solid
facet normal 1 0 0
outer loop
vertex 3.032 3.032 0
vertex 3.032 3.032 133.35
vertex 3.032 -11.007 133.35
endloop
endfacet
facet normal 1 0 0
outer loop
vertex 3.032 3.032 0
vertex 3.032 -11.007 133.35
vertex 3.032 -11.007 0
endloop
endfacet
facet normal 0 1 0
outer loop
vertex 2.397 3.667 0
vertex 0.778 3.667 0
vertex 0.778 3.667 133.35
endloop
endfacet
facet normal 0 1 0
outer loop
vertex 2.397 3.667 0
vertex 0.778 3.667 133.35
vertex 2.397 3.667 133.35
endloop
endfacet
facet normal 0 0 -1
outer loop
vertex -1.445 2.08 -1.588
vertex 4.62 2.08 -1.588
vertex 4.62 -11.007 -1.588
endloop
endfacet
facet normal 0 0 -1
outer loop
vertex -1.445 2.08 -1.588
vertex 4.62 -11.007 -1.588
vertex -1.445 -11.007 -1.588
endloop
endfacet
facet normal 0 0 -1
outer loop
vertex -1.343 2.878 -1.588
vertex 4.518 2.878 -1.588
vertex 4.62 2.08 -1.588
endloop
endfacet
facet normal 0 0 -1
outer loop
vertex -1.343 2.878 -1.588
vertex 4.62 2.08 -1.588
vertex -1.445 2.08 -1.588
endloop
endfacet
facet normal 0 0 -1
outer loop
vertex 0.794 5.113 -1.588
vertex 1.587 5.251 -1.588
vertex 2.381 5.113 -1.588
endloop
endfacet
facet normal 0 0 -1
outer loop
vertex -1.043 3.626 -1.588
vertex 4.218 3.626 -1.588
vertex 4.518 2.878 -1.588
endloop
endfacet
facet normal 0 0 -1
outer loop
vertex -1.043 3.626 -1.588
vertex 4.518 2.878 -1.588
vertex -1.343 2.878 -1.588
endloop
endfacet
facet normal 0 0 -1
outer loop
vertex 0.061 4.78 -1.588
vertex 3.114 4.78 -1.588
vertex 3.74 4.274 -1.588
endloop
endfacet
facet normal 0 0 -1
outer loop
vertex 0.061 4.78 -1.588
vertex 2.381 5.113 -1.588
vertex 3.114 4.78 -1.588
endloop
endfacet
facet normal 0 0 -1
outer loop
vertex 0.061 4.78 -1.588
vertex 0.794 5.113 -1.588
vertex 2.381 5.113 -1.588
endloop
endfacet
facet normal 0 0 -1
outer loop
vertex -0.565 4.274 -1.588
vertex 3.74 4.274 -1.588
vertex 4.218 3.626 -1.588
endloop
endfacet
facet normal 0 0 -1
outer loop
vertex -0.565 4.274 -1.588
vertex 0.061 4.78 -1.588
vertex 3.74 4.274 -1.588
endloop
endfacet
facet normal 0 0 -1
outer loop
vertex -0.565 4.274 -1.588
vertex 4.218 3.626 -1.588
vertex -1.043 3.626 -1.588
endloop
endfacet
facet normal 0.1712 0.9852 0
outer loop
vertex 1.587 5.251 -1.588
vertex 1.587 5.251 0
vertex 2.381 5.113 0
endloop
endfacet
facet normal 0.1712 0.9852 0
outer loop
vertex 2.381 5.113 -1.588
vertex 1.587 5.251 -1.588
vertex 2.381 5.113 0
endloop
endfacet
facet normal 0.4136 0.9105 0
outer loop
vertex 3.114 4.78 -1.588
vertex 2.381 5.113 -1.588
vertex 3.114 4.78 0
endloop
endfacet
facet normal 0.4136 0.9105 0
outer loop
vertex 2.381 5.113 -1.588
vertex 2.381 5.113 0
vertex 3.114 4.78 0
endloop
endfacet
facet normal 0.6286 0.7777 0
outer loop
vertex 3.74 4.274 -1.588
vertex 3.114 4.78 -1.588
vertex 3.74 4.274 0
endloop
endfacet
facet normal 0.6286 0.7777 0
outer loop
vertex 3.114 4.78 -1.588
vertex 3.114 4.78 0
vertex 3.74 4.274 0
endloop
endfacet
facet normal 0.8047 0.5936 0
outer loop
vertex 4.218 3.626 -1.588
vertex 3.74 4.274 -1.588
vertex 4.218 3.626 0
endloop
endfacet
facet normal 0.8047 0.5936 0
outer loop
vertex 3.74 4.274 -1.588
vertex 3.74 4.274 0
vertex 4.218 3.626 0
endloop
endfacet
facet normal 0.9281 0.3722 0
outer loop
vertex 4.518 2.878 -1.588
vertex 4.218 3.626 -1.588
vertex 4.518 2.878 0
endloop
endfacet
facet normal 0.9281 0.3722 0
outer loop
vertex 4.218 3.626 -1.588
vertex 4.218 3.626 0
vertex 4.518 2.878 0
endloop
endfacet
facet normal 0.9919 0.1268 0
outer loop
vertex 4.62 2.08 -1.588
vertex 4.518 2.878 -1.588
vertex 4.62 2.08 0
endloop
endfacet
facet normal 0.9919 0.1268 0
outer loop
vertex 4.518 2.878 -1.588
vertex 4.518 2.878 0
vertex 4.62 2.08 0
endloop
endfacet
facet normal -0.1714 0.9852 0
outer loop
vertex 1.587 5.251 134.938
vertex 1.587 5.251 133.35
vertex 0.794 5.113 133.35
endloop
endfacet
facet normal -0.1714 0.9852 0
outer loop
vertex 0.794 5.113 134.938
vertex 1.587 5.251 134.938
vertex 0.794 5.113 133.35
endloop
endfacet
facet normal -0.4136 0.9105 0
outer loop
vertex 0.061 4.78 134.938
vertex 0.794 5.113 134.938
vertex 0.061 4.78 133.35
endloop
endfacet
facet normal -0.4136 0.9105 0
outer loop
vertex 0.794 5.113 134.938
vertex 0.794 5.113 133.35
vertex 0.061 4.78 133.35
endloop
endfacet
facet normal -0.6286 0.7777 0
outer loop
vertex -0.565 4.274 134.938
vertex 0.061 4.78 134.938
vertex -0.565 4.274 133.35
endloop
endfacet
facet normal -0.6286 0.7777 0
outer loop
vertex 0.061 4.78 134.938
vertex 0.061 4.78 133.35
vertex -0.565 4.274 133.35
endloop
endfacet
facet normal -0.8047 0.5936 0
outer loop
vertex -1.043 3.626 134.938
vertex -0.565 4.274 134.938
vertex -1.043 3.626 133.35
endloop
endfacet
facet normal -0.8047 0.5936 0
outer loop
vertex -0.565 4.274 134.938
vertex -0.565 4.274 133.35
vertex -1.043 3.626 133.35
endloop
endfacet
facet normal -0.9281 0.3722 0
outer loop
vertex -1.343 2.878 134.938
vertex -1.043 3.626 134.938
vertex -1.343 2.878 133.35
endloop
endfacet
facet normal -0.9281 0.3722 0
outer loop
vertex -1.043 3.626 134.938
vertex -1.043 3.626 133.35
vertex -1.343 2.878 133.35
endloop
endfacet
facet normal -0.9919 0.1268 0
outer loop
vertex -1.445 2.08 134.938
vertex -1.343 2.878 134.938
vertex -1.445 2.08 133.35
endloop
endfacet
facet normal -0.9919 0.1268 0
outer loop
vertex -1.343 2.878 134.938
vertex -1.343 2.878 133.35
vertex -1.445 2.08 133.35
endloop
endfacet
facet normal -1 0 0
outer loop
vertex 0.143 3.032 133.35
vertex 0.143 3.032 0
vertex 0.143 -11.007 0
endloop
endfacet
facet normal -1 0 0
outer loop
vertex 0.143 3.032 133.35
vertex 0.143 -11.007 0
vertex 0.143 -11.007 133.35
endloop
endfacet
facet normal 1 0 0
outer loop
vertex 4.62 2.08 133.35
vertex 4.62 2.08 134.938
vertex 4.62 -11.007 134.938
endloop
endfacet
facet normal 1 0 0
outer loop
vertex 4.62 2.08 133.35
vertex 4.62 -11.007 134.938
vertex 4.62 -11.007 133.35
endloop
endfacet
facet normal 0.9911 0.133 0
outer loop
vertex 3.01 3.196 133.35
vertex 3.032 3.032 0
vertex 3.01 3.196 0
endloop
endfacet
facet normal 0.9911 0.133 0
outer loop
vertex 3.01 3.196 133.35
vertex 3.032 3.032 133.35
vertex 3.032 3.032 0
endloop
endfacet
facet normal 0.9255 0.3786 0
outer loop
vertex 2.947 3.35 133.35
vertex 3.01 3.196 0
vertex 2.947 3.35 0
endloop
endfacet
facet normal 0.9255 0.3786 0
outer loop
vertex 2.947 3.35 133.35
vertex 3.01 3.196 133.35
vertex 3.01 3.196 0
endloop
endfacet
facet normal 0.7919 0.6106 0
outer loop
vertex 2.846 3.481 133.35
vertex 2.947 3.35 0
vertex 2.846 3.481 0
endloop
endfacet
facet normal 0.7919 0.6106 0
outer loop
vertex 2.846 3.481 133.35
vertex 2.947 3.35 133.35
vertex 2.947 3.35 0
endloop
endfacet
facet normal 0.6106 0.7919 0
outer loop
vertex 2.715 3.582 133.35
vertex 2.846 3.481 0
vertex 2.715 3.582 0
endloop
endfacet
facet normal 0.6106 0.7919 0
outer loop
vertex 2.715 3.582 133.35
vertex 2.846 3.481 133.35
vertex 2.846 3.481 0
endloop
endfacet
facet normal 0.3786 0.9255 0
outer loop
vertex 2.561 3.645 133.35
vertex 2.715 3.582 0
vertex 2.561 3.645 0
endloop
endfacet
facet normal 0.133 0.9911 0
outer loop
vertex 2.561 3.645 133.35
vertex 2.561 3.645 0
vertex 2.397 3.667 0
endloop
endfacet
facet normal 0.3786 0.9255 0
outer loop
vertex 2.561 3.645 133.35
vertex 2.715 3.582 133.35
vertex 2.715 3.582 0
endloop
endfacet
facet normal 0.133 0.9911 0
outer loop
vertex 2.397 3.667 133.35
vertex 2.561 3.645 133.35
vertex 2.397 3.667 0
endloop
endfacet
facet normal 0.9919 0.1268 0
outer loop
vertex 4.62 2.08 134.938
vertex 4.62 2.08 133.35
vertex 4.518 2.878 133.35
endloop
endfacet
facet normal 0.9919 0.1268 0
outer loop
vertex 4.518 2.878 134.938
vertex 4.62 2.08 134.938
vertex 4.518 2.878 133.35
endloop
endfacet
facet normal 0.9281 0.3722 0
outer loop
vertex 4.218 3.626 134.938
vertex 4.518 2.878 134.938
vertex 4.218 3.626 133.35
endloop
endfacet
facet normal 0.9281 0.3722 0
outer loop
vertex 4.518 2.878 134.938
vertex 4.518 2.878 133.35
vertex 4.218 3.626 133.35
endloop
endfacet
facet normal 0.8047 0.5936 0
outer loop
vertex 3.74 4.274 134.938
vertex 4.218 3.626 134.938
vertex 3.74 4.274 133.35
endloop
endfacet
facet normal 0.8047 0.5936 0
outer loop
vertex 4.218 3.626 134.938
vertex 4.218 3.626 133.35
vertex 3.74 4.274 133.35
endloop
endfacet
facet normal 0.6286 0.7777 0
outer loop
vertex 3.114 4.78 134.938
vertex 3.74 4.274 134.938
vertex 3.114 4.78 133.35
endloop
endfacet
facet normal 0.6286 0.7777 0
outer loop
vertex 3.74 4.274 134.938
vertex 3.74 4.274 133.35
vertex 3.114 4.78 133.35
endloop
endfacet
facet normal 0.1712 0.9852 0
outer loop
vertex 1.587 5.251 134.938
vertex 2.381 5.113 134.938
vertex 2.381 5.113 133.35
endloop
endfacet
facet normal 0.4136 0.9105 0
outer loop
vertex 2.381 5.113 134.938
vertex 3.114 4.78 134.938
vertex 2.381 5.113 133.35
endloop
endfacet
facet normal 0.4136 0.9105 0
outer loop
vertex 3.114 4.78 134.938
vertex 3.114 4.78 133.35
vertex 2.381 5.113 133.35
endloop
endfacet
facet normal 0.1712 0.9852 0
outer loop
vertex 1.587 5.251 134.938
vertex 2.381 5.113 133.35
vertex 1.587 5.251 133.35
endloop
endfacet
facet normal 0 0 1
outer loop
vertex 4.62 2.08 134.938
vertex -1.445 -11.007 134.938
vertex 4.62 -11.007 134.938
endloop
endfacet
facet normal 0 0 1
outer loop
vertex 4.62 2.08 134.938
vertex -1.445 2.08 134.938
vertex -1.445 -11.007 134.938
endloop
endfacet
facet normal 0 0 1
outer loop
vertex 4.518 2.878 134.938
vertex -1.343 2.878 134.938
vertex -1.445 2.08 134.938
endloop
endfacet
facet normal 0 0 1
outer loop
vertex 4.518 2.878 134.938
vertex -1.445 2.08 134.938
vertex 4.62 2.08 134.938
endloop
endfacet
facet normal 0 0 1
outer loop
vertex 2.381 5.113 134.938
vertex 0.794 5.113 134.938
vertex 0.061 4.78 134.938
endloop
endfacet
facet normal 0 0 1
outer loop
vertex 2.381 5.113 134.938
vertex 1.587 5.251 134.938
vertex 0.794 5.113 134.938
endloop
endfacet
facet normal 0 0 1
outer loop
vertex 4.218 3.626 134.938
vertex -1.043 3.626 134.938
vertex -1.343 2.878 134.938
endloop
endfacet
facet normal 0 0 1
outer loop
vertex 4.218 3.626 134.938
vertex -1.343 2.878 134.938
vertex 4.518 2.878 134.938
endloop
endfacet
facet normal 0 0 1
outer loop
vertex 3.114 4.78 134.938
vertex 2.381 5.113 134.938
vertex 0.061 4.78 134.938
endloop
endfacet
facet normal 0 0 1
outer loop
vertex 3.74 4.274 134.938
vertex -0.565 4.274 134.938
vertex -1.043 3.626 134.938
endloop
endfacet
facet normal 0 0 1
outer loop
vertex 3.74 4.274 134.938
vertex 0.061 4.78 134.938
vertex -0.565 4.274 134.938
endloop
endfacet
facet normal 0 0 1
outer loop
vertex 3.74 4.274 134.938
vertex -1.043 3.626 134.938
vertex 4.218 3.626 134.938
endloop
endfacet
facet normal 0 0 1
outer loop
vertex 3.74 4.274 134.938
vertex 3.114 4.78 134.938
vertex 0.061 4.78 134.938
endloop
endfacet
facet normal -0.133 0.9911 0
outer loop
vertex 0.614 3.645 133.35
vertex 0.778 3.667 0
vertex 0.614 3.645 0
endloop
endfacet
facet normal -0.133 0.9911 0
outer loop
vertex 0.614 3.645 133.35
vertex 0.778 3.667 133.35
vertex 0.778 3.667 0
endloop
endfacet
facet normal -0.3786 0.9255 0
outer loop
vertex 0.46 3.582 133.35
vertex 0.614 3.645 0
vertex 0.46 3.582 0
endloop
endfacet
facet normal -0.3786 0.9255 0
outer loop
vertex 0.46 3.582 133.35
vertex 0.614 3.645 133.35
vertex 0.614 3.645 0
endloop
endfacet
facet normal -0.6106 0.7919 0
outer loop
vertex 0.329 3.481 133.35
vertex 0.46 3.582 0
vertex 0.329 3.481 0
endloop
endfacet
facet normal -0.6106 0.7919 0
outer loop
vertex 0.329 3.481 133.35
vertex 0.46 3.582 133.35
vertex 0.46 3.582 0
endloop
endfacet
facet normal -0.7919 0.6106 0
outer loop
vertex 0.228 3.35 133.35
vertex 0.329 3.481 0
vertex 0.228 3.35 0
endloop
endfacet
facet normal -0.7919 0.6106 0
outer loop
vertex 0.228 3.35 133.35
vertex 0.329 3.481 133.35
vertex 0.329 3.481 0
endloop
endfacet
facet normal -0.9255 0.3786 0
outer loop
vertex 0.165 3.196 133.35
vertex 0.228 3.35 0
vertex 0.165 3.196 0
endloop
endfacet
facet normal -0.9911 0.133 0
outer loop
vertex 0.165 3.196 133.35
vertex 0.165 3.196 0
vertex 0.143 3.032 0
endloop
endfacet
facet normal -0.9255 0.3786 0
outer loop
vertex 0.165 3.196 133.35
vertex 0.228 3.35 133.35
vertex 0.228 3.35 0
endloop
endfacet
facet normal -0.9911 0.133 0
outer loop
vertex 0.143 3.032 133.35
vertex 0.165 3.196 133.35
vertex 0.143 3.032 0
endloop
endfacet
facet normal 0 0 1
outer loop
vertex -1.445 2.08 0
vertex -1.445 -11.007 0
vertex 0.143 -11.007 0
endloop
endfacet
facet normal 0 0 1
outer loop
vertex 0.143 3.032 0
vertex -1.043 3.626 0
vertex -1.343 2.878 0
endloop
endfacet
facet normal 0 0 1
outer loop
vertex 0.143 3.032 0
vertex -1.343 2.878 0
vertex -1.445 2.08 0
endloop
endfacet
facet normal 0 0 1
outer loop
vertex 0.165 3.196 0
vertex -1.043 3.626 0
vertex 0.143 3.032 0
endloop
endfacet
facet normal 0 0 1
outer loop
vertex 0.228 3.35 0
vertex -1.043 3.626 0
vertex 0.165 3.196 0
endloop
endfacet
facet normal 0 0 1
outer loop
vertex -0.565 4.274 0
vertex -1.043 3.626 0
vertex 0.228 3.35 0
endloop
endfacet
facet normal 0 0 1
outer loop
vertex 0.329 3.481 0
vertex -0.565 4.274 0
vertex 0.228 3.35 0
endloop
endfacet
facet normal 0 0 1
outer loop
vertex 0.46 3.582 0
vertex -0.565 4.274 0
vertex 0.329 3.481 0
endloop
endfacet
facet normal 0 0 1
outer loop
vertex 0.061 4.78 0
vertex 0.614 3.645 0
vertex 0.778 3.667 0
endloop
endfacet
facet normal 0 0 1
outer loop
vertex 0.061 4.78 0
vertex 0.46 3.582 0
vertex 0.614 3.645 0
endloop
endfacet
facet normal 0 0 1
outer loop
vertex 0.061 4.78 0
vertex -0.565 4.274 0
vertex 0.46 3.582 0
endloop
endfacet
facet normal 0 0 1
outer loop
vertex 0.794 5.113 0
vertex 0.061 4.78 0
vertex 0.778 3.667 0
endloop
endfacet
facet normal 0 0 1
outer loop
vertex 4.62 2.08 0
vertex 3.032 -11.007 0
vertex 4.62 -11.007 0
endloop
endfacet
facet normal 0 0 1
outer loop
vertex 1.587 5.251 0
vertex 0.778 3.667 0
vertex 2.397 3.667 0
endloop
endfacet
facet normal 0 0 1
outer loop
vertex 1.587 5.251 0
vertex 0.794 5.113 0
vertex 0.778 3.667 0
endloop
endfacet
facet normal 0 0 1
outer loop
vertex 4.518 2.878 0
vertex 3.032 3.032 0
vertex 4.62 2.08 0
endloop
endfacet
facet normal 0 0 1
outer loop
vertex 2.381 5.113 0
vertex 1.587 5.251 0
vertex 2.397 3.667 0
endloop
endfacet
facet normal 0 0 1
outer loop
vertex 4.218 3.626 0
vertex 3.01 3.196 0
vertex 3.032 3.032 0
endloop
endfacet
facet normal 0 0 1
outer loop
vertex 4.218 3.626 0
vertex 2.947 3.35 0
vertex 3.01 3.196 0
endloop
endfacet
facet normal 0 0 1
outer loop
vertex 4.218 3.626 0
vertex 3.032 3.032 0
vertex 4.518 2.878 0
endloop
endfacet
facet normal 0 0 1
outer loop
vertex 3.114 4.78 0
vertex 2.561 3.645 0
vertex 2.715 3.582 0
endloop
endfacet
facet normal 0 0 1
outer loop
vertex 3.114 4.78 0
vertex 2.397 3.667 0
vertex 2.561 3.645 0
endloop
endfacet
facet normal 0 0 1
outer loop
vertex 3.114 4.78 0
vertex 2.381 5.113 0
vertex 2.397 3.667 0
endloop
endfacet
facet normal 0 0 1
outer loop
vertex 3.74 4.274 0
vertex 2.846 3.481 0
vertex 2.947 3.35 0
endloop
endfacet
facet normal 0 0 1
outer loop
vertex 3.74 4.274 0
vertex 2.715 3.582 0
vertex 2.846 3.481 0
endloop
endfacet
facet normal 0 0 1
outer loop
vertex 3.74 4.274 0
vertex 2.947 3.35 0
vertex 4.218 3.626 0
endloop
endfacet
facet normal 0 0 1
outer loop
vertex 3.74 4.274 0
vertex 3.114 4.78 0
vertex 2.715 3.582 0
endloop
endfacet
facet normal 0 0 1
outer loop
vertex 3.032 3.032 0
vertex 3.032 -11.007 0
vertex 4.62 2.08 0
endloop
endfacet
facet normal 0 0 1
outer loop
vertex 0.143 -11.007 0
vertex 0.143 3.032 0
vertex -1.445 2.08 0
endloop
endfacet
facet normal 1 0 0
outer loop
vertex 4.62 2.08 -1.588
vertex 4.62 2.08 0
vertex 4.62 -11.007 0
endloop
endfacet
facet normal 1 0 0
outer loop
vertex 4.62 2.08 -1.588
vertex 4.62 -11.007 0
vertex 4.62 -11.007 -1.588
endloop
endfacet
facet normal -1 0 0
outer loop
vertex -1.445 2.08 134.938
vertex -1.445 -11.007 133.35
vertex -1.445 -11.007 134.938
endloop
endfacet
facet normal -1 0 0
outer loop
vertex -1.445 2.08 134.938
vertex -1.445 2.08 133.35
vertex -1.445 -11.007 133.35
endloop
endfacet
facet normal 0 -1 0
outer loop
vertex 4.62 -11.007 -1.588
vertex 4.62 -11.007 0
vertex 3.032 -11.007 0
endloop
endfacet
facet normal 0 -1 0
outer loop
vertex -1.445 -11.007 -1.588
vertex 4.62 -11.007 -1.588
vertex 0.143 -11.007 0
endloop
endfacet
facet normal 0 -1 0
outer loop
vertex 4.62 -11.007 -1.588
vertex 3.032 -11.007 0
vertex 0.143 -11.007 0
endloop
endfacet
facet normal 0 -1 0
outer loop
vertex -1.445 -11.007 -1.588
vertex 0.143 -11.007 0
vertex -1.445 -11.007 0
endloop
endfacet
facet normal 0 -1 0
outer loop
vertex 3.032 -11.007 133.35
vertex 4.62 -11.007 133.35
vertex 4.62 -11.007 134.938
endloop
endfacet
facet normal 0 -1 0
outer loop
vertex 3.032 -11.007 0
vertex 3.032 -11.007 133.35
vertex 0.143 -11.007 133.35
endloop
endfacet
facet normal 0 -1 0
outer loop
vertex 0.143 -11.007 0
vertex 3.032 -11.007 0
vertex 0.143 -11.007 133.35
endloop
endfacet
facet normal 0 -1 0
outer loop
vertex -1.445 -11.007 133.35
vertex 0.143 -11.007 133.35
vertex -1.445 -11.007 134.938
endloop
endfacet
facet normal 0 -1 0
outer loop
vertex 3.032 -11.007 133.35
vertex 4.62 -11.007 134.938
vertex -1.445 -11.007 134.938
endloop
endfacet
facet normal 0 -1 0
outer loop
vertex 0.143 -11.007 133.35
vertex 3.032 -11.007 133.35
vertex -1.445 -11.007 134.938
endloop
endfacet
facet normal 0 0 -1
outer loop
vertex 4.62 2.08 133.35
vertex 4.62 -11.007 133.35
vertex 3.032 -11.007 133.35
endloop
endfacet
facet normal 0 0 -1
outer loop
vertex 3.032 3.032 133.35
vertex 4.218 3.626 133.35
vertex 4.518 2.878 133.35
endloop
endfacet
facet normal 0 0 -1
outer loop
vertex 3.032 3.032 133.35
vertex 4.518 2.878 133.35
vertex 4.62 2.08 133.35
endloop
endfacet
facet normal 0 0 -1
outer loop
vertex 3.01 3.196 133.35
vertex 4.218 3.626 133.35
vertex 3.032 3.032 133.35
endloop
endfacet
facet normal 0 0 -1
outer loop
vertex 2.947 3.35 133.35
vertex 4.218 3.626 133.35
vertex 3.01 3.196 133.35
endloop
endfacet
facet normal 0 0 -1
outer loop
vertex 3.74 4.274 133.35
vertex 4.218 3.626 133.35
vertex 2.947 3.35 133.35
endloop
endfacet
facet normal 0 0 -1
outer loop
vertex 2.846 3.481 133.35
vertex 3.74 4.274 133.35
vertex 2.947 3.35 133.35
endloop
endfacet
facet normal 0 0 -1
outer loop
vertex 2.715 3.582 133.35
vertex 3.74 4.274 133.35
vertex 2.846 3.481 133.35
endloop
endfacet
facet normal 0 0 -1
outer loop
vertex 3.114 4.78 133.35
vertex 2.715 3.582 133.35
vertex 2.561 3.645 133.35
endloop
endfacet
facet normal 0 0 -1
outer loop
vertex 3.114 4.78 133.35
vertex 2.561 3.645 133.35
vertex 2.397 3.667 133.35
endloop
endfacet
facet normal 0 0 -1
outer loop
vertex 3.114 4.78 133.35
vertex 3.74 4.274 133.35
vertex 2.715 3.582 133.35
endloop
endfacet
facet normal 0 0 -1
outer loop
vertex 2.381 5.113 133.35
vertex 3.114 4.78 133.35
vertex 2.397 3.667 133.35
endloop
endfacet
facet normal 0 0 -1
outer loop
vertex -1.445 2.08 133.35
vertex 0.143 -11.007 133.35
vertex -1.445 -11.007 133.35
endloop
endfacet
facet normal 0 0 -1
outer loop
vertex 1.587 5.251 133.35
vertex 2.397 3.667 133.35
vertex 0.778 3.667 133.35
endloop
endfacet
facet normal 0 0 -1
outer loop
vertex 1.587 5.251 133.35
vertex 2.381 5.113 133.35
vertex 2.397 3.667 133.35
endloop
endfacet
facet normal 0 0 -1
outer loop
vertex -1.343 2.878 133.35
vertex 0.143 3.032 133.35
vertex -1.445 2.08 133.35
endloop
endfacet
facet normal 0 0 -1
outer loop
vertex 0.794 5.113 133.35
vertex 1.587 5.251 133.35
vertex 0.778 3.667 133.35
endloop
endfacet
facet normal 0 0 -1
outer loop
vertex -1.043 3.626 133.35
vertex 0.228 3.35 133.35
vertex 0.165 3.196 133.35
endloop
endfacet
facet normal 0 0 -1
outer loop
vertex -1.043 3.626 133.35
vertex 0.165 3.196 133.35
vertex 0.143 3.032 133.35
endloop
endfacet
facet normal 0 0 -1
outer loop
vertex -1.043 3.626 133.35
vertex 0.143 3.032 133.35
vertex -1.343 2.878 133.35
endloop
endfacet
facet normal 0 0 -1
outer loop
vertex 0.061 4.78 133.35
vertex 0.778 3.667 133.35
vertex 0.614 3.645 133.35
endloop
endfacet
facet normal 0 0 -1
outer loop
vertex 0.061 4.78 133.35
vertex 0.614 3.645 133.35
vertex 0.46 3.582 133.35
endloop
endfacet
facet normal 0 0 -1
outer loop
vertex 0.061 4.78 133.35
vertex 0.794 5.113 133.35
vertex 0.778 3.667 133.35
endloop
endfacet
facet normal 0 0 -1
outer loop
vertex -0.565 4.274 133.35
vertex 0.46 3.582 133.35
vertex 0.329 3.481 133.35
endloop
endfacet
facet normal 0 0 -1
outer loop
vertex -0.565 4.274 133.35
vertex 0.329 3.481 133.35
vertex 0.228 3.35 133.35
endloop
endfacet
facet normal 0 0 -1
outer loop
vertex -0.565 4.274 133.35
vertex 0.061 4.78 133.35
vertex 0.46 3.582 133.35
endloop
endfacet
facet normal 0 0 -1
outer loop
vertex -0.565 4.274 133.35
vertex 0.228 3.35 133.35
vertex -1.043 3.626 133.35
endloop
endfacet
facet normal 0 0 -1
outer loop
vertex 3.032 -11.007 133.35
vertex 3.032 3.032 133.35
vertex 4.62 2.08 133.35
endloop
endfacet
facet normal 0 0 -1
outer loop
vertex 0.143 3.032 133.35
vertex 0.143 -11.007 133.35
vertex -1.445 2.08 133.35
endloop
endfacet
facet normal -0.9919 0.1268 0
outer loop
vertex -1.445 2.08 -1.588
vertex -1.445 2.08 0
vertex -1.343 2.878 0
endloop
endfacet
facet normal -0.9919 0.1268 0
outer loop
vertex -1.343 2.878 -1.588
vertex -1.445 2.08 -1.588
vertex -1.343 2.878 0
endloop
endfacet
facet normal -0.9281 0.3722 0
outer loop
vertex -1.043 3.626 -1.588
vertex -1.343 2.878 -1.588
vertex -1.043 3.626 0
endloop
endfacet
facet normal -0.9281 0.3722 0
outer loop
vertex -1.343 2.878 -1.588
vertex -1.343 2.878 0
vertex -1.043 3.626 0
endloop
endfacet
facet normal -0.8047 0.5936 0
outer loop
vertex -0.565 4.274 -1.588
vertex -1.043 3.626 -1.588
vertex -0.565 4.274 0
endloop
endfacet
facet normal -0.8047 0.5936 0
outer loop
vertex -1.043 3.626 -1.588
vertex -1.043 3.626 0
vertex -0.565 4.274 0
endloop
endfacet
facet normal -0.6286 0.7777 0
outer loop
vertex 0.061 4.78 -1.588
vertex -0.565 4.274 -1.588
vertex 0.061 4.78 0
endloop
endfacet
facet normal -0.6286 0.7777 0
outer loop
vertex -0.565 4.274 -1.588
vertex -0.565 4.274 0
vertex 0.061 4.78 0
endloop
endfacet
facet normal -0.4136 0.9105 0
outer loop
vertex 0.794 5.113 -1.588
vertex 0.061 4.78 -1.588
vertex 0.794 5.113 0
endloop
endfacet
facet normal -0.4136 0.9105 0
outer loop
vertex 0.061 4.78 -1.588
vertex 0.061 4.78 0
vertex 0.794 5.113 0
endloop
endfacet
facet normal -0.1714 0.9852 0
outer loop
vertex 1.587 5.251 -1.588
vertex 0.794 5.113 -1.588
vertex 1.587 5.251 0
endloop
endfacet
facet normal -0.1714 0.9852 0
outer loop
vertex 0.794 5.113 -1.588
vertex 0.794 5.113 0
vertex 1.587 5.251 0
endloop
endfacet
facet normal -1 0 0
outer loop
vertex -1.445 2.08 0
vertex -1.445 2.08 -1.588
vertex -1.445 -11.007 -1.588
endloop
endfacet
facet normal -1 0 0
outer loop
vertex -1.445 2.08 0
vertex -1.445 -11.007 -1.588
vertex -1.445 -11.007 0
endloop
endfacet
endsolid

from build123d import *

# Parameters (mm, degrees)
BOSS_EXTRUDE1_DEPTH  = 133.35
SKETCH2_W            = 6.06425
SKETCH2_H            = 5.11175
BOSS_EXTRUDE2_DEPTH  = 1.5875
FILLET1_R            = 3.175
FILLET1_OF_MIRROR1_R = 3.175
FILLET2_R            = 0.635
BOSS_EXTRUDE3_DEPTH  = 11.150000052


with BuildPart() as part:
    # Sketch1 → Boss-Extrude1 (new body)
    with BuildSketch(Plane.XY):
        Polygon((0.142875, 3.667125), (3.032125, 3.667125), (3.032125, 1.905), (3.032125, 0.142875), (0.142875, 0.142875), (0.142875, 1.905), align=None)
    extrude(amount=BOSS_EXTRUDE1_DEPTH)

    # Sketch2 → Boss-Extrude2 (add)
    with BuildSketch(Plane.XY.offset(133.35)):
        with Locations((1.5875, 2.69875)):
            Rectangle(SKETCH2_W, SKETCH2_H)
    boss_extrude2 = extrude(amount=BOSS_EXTRUDE2_DEPTH)

    # Fillet1
    # the kernel refuses this fillet: 3.175 mm, written as the material it takes off along each edge
    with BuildSketch(Plane(origin=(-1.444625, 5.254625, 125.4125), x_dir=(0, -1, 0), z_dir=(0, 0, 1))) as fillet1_piece_1:
        with BuildLine():
            CenterArc((FILLET1_R, FILLET1_R), FILLET1_R, 180, 90)
            Line((0, FILLET1_R), (0, 0))
            Line((0, 0), (FILLET1_R, 0))
        make_face()
    extrude(amount=17.4625, mode=Mode.SUBTRACT)
    with BuildSketch(Plane(origin=(4.619625, 5.254625, 125.4125), x_dir=(0, -1, 0), z_dir=(0, 0, 1))) as fillet1_piece_2:
        with BuildLine():
            CenterArc((FILLET1_R, -FILLET1_R), FILLET1_R, 90, 90)
            Line((0, -FILLET1_R), (0, 0))
            Line((0, 0), (FILLET1_R, 0))
        make_face()
    extrude(amount=17.4625, mode=Mode.SUBTRACT)

    # Mirror1: Boss-Extrude2 across plane
    add(boss_extrude2.mirror(Plane.XY.offset(66.675)))

    # Fillet1 of Mirror1
    # the kernel refuses this fillet: 3.175 mm, written as the material it takes off along each edge
    with BuildSketch(Plane(origin=(-1.444625, 5.254625, 7.9375), x_dir=(0, -1, 0), z_dir=(0, 0, -1))) as fillet1_of_mirror1_piece_1:
        with BuildLine():
            CenterArc((FILLET1_OF_MIRROR1_R, -FILLET1_OF_MIRROR1_R), FILLET1_OF_MIRROR1_R, 90, 90)
            Line((0, -FILLET1_OF_MIRROR1_R), (0, 0))
            Line((0, 0), (FILLET1_OF_MIRROR1_R, 0))
        make_face()
    extrude(amount=17.4625, mode=Mode.SUBTRACT)
    with BuildSketch(Plane(origin=(4.619625, 5.254625, 7.9375), x_dir=(0, -1, 0), z_dir=(0, 0, -1))) as fillet1_of_mirror1_piece_2:
        with BuildLine():
            CenterArc((FILLET1_OF_MIRROR1_R, FILLET1_OF_MIRROR1_R), FILLET1_OF_MIRROR1_R, 180, 90)
            Line((0, FILLET1_OF_MIRROR1_R), (0, 0))
            Line((0, 0), (FILLET1_OF_MIRROR1_R, 0))
        make_face()
    extrude(amount=17.4625, mode=Mode.SUBTRACT)

    # Fillet2
    fillet2_edges = [part.edges().sort_by_distance(p)[0] for p in [
        (3.032125, 3.667125, 66.675),
        (0.142875, 3.667125, 66.675),
    ]]
    fillet(fillet2_edges, radius=FILLET2_R)

    # Sketch3 → Boss-Extrude3 (add)
    with BuildSketch(Plane.XZ.offset(-0.142875)):
        Polygon((-1.444625, 134.9375), (4.619625, 134.9375), (4.619625, 133.35), (3.032125, 133.35), (3.032125, 0), (4.619625, 0), (4.619625, -1.5875), (-1.444625, -1.5875), (-1.444625, 0), (0.142875, 0), (0.142875, 133.35), (-1.444625, 133.35), align=None)
    extrude(amount=BOSS_EXTRUDE3_DEPTH)


solid = part.part
